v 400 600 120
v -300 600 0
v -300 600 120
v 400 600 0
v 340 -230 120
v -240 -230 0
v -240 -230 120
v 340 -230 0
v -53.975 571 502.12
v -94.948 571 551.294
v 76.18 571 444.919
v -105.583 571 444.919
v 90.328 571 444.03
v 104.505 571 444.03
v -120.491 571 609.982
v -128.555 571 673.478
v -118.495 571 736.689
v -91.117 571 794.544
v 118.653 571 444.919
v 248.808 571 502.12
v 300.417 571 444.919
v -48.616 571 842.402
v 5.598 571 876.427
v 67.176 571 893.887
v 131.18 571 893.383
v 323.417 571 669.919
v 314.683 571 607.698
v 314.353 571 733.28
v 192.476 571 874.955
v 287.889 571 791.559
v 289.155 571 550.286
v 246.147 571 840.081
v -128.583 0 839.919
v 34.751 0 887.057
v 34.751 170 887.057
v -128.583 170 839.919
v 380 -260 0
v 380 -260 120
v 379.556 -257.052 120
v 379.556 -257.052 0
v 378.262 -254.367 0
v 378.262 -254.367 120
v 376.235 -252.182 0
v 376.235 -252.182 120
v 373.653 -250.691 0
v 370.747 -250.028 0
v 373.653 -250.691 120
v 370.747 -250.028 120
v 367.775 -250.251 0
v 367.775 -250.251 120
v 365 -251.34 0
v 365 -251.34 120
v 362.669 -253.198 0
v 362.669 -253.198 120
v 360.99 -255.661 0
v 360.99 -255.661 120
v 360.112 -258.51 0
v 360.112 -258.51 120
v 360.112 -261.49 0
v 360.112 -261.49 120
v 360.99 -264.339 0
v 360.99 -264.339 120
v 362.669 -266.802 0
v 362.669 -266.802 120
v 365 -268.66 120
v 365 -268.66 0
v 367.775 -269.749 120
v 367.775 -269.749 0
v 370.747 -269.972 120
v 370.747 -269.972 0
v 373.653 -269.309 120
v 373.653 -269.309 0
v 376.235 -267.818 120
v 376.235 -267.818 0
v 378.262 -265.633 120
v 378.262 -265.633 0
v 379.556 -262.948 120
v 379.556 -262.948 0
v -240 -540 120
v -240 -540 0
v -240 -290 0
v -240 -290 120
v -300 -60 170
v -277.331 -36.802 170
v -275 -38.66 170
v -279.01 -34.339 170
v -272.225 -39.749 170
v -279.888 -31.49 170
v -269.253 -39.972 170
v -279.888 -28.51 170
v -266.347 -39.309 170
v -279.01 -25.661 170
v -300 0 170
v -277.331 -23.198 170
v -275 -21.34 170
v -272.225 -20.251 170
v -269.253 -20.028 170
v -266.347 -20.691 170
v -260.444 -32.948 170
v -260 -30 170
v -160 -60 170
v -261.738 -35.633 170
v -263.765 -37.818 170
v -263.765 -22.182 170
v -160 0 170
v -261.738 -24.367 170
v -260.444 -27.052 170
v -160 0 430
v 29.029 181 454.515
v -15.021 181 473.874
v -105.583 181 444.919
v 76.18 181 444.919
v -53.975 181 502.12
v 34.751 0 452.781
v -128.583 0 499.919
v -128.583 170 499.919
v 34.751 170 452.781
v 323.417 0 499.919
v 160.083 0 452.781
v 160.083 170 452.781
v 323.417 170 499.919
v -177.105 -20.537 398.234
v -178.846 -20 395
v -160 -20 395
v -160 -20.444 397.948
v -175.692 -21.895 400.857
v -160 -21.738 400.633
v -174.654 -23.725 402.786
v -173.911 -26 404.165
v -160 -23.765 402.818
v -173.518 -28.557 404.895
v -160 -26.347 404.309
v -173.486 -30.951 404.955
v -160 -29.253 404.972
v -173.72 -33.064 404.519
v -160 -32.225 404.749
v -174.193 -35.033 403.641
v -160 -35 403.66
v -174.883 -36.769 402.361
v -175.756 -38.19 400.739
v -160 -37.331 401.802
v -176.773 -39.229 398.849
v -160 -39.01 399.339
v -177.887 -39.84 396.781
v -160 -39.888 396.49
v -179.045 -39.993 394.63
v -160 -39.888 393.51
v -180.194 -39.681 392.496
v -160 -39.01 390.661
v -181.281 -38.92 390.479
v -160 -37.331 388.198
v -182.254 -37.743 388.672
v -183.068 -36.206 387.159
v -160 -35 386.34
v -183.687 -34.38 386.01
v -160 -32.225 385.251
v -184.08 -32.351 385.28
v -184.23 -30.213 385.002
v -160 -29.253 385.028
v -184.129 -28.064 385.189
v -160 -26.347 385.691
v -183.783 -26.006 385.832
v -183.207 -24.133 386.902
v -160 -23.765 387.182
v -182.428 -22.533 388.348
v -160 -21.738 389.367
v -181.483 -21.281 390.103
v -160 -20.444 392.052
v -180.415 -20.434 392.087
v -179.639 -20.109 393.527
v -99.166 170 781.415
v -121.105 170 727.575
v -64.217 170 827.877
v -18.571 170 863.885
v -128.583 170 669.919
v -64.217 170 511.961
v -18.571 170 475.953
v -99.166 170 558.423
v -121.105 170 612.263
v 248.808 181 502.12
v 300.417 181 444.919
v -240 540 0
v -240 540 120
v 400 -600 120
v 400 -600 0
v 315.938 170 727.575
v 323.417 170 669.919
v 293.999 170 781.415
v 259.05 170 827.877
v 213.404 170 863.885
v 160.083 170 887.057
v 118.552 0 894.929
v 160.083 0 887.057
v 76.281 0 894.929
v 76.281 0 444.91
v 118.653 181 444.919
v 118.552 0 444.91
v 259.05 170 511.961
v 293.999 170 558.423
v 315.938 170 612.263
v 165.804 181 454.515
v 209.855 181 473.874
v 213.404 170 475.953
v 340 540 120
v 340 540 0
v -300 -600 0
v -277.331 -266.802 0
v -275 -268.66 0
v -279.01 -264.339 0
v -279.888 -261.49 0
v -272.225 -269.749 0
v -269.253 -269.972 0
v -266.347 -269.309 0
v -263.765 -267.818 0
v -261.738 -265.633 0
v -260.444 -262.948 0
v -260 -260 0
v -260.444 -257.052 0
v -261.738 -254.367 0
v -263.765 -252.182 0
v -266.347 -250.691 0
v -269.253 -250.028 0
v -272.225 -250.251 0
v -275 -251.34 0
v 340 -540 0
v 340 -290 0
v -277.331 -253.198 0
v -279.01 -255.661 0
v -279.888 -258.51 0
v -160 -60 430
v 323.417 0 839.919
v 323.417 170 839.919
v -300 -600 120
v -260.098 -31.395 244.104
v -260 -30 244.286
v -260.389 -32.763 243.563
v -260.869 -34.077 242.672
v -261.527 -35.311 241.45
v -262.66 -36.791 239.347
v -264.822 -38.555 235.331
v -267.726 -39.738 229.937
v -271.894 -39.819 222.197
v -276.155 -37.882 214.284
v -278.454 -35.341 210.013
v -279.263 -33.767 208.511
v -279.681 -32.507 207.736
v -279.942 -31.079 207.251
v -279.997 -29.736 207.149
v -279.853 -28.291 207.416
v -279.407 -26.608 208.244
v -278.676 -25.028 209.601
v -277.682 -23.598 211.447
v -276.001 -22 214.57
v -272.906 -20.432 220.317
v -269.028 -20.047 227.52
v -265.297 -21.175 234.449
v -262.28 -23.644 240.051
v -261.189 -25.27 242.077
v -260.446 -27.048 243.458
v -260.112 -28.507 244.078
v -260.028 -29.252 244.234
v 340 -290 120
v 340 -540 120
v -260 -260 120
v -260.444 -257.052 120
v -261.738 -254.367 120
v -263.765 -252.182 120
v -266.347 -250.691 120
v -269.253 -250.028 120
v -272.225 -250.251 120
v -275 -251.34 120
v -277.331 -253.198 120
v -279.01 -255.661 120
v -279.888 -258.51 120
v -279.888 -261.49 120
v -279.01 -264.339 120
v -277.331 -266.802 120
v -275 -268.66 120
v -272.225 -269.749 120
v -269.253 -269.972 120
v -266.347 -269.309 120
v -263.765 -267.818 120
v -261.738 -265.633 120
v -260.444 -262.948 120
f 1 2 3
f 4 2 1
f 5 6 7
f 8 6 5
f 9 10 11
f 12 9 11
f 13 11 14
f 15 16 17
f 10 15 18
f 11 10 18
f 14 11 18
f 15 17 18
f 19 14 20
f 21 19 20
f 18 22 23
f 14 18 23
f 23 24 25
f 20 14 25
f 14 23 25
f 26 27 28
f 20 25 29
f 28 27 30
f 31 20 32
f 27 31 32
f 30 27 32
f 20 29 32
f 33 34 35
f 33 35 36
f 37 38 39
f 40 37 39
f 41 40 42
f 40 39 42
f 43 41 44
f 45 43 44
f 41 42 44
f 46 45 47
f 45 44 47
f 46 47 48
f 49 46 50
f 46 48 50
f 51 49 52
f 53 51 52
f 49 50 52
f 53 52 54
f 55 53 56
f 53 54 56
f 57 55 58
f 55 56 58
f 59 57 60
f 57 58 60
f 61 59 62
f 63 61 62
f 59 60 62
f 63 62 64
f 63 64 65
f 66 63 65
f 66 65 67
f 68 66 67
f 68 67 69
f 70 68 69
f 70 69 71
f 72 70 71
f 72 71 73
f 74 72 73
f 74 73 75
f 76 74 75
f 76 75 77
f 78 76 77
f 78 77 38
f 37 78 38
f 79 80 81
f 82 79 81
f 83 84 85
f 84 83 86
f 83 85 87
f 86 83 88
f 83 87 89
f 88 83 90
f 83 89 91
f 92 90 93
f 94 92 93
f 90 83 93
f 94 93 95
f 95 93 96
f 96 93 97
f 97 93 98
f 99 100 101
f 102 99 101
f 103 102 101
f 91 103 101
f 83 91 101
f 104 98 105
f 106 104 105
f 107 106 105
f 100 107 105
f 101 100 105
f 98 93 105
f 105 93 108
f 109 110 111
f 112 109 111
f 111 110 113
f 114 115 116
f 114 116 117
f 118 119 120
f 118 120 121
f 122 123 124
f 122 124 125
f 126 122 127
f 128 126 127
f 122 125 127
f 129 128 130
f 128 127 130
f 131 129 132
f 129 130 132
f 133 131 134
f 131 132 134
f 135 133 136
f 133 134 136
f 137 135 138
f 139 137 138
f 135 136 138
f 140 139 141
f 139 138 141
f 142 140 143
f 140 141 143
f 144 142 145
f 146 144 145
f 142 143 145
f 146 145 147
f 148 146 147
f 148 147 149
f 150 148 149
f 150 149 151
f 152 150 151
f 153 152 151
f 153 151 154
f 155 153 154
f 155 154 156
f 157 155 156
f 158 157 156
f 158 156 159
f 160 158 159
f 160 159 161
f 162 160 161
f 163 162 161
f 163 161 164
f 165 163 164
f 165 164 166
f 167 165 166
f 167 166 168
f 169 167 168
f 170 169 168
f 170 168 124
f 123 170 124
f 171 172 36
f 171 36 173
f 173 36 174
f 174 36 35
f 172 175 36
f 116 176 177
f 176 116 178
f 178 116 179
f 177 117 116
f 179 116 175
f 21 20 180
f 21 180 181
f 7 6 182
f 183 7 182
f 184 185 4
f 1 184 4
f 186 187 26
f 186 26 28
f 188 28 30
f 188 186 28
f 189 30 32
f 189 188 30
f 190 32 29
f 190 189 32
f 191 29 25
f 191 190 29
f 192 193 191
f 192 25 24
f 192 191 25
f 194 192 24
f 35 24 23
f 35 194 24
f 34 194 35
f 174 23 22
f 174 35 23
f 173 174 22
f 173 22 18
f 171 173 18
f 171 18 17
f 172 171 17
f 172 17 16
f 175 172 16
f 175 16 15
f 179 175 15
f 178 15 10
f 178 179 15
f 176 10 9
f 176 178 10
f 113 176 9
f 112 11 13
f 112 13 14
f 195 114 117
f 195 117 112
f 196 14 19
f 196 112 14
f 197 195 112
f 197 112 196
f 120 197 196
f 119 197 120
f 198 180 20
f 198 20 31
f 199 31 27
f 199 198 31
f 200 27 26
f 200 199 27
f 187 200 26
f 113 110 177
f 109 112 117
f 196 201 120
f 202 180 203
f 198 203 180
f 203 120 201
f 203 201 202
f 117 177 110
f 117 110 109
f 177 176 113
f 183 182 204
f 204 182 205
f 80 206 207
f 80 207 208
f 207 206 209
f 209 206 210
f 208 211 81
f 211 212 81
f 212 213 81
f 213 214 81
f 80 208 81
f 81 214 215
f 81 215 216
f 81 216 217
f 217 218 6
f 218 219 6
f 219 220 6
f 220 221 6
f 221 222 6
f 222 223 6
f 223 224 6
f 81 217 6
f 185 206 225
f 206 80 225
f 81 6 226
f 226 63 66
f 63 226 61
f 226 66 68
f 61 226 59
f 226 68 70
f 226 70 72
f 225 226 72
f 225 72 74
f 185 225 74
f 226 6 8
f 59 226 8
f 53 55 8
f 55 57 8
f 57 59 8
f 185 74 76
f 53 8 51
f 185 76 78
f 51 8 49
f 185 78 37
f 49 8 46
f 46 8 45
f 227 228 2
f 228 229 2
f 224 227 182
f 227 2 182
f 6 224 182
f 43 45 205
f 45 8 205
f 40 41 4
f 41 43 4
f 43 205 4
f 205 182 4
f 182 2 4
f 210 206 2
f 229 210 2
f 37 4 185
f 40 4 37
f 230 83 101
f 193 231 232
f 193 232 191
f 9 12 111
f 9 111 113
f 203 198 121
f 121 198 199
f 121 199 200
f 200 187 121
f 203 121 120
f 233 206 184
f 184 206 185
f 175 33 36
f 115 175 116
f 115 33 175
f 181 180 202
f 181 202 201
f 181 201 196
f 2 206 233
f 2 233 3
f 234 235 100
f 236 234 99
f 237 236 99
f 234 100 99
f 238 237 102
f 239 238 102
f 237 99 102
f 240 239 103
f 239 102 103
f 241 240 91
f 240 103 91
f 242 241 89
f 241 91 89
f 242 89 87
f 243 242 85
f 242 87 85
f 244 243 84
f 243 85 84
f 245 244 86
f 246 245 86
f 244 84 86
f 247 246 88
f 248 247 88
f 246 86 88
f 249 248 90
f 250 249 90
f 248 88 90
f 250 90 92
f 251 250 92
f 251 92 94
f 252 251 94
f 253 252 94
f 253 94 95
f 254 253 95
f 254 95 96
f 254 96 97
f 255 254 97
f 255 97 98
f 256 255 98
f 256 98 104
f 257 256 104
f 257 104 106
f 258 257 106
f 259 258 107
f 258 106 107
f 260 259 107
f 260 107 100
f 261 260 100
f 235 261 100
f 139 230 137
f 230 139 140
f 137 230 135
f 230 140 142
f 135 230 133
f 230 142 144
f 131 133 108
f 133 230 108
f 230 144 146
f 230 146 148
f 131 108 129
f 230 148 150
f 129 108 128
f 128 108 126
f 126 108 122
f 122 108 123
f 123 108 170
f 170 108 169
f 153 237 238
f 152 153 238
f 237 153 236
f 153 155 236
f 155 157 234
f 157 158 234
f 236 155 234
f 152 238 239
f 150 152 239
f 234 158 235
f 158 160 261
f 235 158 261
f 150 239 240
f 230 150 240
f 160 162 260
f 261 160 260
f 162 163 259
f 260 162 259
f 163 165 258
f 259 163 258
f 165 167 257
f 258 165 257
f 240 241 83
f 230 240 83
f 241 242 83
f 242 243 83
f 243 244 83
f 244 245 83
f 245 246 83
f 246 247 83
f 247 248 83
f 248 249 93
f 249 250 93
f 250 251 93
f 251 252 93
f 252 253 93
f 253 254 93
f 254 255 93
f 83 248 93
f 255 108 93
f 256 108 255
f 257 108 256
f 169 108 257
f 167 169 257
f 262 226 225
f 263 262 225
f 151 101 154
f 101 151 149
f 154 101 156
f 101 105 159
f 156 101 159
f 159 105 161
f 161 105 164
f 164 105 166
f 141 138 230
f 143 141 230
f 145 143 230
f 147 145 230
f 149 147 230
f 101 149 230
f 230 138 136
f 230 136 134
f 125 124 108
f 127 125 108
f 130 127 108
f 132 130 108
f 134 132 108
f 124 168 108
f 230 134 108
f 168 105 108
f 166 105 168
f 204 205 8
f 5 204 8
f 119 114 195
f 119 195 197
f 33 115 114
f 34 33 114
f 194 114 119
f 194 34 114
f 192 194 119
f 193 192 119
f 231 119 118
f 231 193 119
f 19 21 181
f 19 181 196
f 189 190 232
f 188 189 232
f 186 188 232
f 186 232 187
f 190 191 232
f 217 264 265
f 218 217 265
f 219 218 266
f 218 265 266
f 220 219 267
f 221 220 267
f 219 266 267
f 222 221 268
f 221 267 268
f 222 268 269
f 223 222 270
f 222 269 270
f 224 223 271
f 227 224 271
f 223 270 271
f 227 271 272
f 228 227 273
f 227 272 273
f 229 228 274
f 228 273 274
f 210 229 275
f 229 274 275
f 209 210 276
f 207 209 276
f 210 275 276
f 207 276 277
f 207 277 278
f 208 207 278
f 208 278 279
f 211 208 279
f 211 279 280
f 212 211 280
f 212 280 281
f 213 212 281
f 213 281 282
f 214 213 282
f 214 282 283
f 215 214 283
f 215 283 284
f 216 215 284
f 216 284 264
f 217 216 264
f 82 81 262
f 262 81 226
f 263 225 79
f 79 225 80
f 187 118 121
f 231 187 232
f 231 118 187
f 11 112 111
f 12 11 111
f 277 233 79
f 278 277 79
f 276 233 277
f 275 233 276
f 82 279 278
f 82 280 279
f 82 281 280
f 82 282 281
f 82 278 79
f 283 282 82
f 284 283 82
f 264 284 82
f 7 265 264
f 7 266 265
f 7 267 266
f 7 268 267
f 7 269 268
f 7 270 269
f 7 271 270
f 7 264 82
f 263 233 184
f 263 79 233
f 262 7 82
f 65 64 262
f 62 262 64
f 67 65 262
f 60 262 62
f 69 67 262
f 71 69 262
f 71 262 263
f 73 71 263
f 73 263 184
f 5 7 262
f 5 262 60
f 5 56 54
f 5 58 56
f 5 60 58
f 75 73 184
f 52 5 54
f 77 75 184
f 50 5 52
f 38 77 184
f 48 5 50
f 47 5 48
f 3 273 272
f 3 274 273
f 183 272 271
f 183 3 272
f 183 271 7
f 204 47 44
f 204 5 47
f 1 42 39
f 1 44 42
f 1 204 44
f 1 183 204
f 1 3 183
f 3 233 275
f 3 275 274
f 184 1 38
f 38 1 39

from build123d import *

# Parameters (mm, degrees)
F0_W      = 700
F0_H      = 1200
F1_DEPTH  = 120
F0_W_2    = 580
F0_H_2    = 60
F2_DEPTH  = 120
F4_DEPTH  = 60
F5_R      = 10
F6_DEPTH  = 200
F7_R      = 10
F8_DEPTH  = 100
F9_R      = 10
F10_DEPTH = 50
F11_R     = 226
F12_DEPTH = 571
F14_DEPTH = 170
F16_DEPTH = 390


with BuildPart() as f1:
    # F0 (on Top) → F1 (new body)
    with BuildSketch(Plane.XY):
        with Locations((50, 0)):
            Rectangle(F0_W, F0_H)
        Polygon((-240, -230), (-240, 540), (340, 540), (340, -230), (340, -290), (340, -540), (-240, -540), (-240, -290), align=None, mode=Mode.SUBTRACT)
    extrude(amount=F1_DEPTH)

    # F0 (on Top) → F2 (join)
    with BuildSketch(Plane.XY):
        with Locations((50, -260)):
            Rectangle(F0_W_2, F0_H_2)
    extrude(amount=F2_DEPTH)

    # F5 (on face) → F6 (cut)
    with BuildSketch(Plane.XY.offset(120)):
        with Locations((-270, -260)):
            Circle(F5_R)
        with Locations((370, -260)):
            Circle(F5_R)
    extrude(amount=-F6_DEPTH, mode=Mode.SUBTRACT)


with BuildPart() as f4:
    # F3 (on Front) → F4 (new body)
    with BuildSketch(Plane.XZ):
        Polygon((-300, 170), (-160, 170), (-160, 430), align=None)
    extrude(amount=F4_DEPTH)

    # F7 (on face) → F8 (cut)
    with BuildSketch(Plane(origin=(0, 0, 170), x_dir=(1, 0, 0), z_dir=(0, 0, -1))):
        with Locations((-270, 30)):
            Circle(F7_R)
    extrude(amount=-F8_DEPTH, mode=Mode.SUBTRACT)

    # F9 (on face) → F10 (cut)
    with BuildSketch(Plane.YZ.offset(-160)):
        with Locations((-30, 395)):
            Circle(F9_R)
    extrude(amount=-F10_DEPTH, mode=Mode.SUBTRACT)


with BuildPart() as f12:
    # F11 (on Front) → F12 (new body)
    with BuildSketch(Plane.XZ):
        with Locations((97.4165648222, 669.9192523956)):
            Circle(F11_R)
    extrude(amount=-F12_DEPTH)

    # F13 (on face) → F14 (join)
    with BuildSketch(Plane.XZ):
        with BuildLine():
            Line((323.4165648222, 499.9192523956), (323.4165648222, 669.9192523956))
            ThreePointArc((323.4165648222, 669.9192523956), (278.0245878372, 534.0636598622), (160.0825646221, 452.7811109532))
            Line((160.0825646221, 452.7811109532), (323.4165648222, 499.9192523956))
        make_face()
        with BuildLine():
            ThreePointArc((160.0825646221, 887.0573938381), (278.0245878372, 805.7748449291), (323.4165648222, 669.9192523956))
            Line((323.4165648222, 669.9192523956), (323.4165648222, 839.9192523956))
            Line((323.4165648222, 839.9192523956), (160.0825646221, 887.0573938381))
        make_face()
        with BuildLine():
            ThreePointArc((-128.5834351778, 669.9192523956), (-83.1914581928, 805.7748449291), (34.7505650223, 887.0573938381))
            Line((34.7505650223, 887.0573938381), (-128.5834351778, 839.9192523956))
            Line((-128.5834351778, 839.9192523956), (-128.5834351778, 669.9192523956))
        make_face()
        with BuildLine():
            Line((-128.5834351778, 499.9192523956), (34.7505650223, 452.7811109532))
            ThreePointArc((34.7505650223, 452.7811109532), (-83.1914581928, 534.0636598622), (-128.5834351778, 669.9192523956))
            Line((-128.5834351778, 669.9192523956), (-128.5834351778, 499.9192523956))
        make_face()
    extrude(amount=-F14_DEPTH)

    # F15 (on face) → F16 (join)
    with BuildSketch(Plane(origin=(0, 571, 0), x_dir=(-1, 0, 0), z_dir=(0, 1, 0))):
        with BuildLine():
            ThreePointArc((-118.6533254038, 444.9192523956), (-188.3459693974, 463.0186883955), (-248.8084951306, 502.1203148617))
            Line((-248.8084951306, 502.1203148617), (-300.4165648222, 444.9192523956))
            Line((-300.4165648222, 444.9192523956), (-118.6533254038, 444.9192523956))
        make_face()
        with BuildLine():
            Line((105.5834351778, 444.9192523956), (53.9753654862, 502.1203148617))
            ThreePointArc((53.9753654862, 502.1203148617), (-6.487160247, 463.0186883955), (-76.1798042406, 444.9192523956))
            Line((-76.1798042406, 444.9192523956), (105.5834351778, 444.9192523956))
        make_face()
    extrude(amount=-F16_DEPTH)


solid = Compound([f1.part, f4.part, f12.part])
